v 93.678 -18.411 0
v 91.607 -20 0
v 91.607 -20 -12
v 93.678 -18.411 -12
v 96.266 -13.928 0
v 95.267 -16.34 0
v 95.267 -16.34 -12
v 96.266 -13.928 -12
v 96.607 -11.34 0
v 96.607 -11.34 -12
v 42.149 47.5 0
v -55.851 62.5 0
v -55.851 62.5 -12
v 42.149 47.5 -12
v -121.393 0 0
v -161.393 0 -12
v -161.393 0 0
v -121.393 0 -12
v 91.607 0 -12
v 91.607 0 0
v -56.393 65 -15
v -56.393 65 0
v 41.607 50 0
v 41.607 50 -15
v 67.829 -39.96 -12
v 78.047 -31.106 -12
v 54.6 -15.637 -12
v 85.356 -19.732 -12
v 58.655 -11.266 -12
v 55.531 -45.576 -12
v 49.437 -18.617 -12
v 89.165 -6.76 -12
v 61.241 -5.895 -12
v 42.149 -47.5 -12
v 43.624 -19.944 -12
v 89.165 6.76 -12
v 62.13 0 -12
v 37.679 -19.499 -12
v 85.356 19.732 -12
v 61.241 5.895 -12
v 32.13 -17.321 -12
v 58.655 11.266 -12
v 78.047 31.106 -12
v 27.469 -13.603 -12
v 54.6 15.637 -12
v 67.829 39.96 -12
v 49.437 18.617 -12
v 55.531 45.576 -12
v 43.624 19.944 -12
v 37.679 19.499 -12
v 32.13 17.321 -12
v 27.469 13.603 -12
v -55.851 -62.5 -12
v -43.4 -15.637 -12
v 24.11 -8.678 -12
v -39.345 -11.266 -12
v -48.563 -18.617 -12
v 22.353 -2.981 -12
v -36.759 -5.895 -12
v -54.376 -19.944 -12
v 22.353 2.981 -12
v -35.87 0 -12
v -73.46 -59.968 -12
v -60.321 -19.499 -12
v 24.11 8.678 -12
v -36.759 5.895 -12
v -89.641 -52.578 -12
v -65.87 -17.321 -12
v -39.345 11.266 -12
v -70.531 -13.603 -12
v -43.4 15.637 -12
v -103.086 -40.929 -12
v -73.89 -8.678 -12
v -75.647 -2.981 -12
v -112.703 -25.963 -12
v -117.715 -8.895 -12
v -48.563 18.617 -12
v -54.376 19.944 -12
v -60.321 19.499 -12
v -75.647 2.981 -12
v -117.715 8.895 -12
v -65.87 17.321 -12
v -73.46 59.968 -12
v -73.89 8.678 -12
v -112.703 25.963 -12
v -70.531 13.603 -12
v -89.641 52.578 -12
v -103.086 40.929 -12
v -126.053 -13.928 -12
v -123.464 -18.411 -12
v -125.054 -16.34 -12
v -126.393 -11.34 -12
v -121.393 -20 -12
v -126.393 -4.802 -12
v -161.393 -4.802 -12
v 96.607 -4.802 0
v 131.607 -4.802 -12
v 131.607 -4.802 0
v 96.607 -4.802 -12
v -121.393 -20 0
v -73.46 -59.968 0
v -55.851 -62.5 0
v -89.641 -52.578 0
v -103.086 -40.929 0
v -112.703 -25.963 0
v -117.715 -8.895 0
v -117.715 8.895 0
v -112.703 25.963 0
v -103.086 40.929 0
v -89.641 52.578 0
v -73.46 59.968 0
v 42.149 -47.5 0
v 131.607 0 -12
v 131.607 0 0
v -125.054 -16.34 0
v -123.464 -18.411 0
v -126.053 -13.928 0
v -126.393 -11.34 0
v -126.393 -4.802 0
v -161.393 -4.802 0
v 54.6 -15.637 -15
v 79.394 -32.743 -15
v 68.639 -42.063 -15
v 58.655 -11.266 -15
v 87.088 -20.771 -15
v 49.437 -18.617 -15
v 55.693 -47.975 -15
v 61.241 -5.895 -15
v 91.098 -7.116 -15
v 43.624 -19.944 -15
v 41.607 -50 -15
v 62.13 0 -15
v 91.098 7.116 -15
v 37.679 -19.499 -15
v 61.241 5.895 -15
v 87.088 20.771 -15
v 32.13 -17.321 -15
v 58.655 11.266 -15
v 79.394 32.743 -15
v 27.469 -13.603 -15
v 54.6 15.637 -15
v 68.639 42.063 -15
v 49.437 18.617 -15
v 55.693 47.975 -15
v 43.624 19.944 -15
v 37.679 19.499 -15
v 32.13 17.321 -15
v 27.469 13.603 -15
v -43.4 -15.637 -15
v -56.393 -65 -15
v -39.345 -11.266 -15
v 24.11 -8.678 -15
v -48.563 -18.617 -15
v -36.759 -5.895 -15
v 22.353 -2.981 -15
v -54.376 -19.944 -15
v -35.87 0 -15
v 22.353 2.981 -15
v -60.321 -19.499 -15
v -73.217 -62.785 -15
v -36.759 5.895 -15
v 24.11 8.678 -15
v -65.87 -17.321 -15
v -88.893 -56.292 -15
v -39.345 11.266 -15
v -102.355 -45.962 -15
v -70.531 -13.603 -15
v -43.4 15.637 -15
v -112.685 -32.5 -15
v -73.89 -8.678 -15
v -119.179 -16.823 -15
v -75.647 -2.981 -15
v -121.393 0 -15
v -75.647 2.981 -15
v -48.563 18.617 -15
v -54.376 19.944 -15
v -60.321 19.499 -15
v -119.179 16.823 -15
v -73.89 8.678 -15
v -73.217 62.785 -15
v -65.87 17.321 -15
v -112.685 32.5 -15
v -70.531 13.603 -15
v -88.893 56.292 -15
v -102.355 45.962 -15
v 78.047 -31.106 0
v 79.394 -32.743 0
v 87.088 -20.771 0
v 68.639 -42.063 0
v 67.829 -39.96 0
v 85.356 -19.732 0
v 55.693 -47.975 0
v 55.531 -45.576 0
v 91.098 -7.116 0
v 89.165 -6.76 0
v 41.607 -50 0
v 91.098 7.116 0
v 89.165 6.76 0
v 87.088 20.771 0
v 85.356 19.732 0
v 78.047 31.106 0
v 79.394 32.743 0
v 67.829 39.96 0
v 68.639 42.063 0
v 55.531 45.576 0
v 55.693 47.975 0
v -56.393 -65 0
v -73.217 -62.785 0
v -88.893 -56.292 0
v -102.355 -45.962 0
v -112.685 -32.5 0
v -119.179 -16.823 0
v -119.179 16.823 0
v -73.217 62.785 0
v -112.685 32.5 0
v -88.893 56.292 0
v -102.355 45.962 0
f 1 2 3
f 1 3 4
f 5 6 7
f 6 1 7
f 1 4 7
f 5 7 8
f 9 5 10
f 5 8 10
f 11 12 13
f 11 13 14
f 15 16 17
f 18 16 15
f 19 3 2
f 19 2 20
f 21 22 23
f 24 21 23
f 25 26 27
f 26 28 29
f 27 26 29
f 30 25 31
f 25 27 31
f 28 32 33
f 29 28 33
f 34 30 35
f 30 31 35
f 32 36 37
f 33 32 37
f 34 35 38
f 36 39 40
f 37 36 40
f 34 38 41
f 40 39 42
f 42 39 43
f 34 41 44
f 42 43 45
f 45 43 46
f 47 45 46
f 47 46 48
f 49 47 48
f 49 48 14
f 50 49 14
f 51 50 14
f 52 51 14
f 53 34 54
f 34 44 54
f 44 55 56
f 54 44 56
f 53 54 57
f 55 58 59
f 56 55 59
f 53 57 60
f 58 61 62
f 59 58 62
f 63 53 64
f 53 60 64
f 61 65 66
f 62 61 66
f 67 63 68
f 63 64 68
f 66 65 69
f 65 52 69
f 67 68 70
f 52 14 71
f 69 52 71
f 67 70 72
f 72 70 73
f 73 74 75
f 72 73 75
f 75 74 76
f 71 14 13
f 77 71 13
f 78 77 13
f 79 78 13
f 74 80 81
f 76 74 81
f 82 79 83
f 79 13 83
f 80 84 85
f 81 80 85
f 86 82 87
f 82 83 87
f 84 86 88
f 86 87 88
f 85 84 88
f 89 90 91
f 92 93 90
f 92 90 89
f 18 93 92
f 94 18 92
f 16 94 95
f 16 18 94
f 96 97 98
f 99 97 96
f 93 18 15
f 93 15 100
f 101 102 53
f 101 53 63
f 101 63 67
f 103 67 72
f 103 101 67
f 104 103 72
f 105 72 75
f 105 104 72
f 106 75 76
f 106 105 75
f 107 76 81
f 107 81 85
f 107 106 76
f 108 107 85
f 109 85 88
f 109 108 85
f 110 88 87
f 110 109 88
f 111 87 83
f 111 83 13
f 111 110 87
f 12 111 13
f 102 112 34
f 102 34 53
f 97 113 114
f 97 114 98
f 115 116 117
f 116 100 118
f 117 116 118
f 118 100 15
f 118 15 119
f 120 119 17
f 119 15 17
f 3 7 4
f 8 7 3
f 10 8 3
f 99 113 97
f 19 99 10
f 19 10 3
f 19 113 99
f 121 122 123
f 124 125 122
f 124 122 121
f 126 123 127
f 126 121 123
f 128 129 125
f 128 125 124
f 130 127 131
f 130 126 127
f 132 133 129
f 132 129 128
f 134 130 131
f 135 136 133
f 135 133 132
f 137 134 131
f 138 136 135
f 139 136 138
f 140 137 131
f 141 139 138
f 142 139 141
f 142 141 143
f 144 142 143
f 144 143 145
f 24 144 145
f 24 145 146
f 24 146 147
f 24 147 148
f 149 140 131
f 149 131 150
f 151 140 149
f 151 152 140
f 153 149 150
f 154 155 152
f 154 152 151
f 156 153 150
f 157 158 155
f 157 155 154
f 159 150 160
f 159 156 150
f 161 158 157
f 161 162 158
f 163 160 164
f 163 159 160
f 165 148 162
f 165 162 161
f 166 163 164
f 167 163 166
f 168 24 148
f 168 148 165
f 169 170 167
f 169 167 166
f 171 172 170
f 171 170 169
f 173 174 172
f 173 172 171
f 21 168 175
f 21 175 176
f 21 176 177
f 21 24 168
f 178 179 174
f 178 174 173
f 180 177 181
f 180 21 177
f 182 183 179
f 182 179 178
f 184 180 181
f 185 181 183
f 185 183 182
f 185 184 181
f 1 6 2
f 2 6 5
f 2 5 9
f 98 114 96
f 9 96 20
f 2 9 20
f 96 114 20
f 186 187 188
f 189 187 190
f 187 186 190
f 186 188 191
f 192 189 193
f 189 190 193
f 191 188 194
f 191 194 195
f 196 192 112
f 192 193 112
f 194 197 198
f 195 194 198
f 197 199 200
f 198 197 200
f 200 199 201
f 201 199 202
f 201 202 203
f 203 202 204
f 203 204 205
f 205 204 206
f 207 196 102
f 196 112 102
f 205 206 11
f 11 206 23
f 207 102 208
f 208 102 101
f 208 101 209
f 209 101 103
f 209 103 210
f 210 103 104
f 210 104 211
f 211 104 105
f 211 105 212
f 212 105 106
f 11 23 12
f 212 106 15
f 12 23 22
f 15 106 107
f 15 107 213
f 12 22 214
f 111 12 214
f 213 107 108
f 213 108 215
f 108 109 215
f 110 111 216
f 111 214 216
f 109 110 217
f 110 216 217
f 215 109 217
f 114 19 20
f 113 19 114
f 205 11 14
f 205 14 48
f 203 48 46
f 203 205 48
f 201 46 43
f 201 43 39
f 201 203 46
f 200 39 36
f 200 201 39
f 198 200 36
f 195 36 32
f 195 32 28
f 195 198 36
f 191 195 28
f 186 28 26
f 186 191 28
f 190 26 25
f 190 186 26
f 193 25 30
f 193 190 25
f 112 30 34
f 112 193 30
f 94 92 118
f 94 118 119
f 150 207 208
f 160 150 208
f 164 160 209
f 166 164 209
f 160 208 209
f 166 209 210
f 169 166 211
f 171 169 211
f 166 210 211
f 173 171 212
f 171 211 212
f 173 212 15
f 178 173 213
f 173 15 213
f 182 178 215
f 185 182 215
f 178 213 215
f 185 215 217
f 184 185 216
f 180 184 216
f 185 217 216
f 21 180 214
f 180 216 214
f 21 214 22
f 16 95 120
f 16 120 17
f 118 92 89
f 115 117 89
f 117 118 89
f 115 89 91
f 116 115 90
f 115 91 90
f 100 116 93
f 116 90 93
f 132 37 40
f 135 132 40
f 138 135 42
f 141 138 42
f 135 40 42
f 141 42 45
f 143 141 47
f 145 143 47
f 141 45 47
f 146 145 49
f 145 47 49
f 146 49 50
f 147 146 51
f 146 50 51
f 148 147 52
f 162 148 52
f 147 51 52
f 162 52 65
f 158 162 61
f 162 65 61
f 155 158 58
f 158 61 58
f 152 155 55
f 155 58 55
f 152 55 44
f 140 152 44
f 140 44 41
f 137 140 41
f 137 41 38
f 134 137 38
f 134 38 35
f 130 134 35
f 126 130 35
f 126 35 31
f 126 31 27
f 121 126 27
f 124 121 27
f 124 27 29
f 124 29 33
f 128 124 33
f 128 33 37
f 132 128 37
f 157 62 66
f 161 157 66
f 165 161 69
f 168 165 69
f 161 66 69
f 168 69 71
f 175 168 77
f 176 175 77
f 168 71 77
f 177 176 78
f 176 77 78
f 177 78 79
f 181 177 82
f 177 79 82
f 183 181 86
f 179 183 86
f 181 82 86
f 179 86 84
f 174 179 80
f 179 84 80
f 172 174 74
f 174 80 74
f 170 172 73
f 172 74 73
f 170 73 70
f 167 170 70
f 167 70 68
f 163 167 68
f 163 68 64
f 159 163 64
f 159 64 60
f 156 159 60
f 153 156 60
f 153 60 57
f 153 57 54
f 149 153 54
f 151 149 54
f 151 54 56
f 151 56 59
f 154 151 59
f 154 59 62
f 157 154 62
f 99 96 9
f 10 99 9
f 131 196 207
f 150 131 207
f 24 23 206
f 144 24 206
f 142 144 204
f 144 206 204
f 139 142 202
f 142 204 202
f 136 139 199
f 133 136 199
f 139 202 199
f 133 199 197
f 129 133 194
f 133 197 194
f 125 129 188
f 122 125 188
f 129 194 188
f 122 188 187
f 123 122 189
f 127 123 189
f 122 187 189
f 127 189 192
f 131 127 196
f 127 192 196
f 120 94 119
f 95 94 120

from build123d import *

# Parameters (mm, degrees)
BOSS_EXTRUDE1_DEPTH   = 15
CUT_EXTRUDE1_DEPTH    = 12
SKETCH3_R             = 20
CUT_EXTRUDE2_DEPTH    = 12
BOSS_EXTRUDE2_DEPTH   = 12
BOSS_EXTRUDE2_2_DEPTH = 12
FILLET1_R             = 10
FILLET2_R             = 10


with BuildPart() as part:
    # Sketch1 → Boss-Extrude1 (new body)
    with BuildSketch(Plane.XY):
        with BuildLine():
            Line((-56.393356643, 65), (41.606643357, 50))
            ThreePointArc((41.606643357, 50), (91.606643357, 0), (41.606643357, -50))
            Line((41.606643357, -50), (-56.393356643, -65))
            ThreePointArc((-56.393356643, -65), (-121.393356643, 0), (-56.393356643, 65))
        make_face()
    extrude(amount=-BOSS_EXTRUDE1_DEPTH)

    # Sketch2 → Cut-Extrude1 (cut)
    with BuildSketch(Plane.XY):
        with BuildLine():
            Line((-55.851288068, 62.5), (42.148711932, 47.5))
            ThreePointArc((42.148711932, 47.5), (89.648711932, 0), (42.148711932, -47.5))
            Line((42.148711932, -47.5), (-55.851288068, -62.5))
            ThreePointArc((-55.851288068, -62.5), (-118.351288068, 0), (-55.851288068, 62.5))
        make_face()
    extrude(amount=-CUT_EXTRUDE1_DEPTH, mode=Mode.SUBTRACT)

    # Sketch3 → Cut-Extrude2 (cut)
    with BuildSketch(Plane.XY.offset(-12)):
        with Locations((-55.870216449, 0)):
            Circle(SKETCH3_R)
        with Locations((42.129783551, 0)):
            Circle(SKETCH3_R)
    extrude(amount=-CUT_EXTRUDE2_DEPTH, mode=Mode.SUBTRACT)


with BuildPart() as body_2:
    # Sketch4 → Boss-Extrude2 (new body)
    with BuildSketch(Plane.XY.offset(-12)):
        Polygon((-161.393356643, 0), (-121.393356643, 0), (-121.393356643, -20), (-126.393356643, -20), (-126.393356643, -4.801542048), (-161.393356643, -4.801542048), align=None)
    extrude(amount=BOSS_EXTRUDE2_DEPTH)

    # Fillet1
    # the kernel refuses this fillet: 10 mm, written as the material it takes off along each edge
    with BuildSketch(Plane(origin=(-126.393356643, -20, -33.650635095), x_dir=(1, 0, 0), z_dir=(0, 0, 1))) as fillet1_piece_1:
        with BuildLine():
            CenterArc((10, 8.660254038), FILLET1_R, 180, 60)
            Line((0, 8.660254038), (-0.2, 8.660254038))
            Line((-0.2, 8.660254038), (-0.2, 0))
            Line((-0.2, 0), (0, -0.2))
            ThreePointArc((0, -0.2), (2.5, -0.2), (4.9, -0.173205081))
            Line((4.9, -0.173205081), (5, 0))
        make_face()
    extrude(amount=55.301270189, mode=Mode.SUBTRACT)


with BuildPart() as body_3:
    # Sketch4 → Boss-Extrude2 2 (new body)
    with BuildSketch(Plane.XY.offset(-12)):
        Polygon((91.606643357, 0), (131.606643357, 0), (131.606643357, -4.801542048), (96.606643357, -4.801542048), (96.606643357, -20), (91.606643357, -20), align=None)
    extrude(amount=BOSS_EXTRUDE2_2_DEPTH)

    # Fillet2
    # the kernel refuses this fillet: 10 mm, written as the material it takes off along each edge
    with BuildSketch(Plane(origin=(96.606643357, -20, -33.650635095), x_dir=(0, 1, 0), z_dir=(0, 0, 1))) as fillet2_piece_1:
        with BuildLine():
            CenterArc((8.660254038, 10), FILLET2_R, 210, 60)
            Line((0, 5), (-0.173205081, 4.9))
            ThreePointArc((-0.173205081, 4.9), (-0.2, 2.5), (-0.2, 0))
            Line((-0.2, 0), (0, -0.2))
            Line((0, -0.2), (8.660254038, -0.2))
            Line((8.660254038, -0.2), (8.660254038, 0))
        make_face()
    extrude(amount=55.301270189, mode=Mode.SUBTRACT)


solid = Compound([part.part, body_2.part, body_3.part])
